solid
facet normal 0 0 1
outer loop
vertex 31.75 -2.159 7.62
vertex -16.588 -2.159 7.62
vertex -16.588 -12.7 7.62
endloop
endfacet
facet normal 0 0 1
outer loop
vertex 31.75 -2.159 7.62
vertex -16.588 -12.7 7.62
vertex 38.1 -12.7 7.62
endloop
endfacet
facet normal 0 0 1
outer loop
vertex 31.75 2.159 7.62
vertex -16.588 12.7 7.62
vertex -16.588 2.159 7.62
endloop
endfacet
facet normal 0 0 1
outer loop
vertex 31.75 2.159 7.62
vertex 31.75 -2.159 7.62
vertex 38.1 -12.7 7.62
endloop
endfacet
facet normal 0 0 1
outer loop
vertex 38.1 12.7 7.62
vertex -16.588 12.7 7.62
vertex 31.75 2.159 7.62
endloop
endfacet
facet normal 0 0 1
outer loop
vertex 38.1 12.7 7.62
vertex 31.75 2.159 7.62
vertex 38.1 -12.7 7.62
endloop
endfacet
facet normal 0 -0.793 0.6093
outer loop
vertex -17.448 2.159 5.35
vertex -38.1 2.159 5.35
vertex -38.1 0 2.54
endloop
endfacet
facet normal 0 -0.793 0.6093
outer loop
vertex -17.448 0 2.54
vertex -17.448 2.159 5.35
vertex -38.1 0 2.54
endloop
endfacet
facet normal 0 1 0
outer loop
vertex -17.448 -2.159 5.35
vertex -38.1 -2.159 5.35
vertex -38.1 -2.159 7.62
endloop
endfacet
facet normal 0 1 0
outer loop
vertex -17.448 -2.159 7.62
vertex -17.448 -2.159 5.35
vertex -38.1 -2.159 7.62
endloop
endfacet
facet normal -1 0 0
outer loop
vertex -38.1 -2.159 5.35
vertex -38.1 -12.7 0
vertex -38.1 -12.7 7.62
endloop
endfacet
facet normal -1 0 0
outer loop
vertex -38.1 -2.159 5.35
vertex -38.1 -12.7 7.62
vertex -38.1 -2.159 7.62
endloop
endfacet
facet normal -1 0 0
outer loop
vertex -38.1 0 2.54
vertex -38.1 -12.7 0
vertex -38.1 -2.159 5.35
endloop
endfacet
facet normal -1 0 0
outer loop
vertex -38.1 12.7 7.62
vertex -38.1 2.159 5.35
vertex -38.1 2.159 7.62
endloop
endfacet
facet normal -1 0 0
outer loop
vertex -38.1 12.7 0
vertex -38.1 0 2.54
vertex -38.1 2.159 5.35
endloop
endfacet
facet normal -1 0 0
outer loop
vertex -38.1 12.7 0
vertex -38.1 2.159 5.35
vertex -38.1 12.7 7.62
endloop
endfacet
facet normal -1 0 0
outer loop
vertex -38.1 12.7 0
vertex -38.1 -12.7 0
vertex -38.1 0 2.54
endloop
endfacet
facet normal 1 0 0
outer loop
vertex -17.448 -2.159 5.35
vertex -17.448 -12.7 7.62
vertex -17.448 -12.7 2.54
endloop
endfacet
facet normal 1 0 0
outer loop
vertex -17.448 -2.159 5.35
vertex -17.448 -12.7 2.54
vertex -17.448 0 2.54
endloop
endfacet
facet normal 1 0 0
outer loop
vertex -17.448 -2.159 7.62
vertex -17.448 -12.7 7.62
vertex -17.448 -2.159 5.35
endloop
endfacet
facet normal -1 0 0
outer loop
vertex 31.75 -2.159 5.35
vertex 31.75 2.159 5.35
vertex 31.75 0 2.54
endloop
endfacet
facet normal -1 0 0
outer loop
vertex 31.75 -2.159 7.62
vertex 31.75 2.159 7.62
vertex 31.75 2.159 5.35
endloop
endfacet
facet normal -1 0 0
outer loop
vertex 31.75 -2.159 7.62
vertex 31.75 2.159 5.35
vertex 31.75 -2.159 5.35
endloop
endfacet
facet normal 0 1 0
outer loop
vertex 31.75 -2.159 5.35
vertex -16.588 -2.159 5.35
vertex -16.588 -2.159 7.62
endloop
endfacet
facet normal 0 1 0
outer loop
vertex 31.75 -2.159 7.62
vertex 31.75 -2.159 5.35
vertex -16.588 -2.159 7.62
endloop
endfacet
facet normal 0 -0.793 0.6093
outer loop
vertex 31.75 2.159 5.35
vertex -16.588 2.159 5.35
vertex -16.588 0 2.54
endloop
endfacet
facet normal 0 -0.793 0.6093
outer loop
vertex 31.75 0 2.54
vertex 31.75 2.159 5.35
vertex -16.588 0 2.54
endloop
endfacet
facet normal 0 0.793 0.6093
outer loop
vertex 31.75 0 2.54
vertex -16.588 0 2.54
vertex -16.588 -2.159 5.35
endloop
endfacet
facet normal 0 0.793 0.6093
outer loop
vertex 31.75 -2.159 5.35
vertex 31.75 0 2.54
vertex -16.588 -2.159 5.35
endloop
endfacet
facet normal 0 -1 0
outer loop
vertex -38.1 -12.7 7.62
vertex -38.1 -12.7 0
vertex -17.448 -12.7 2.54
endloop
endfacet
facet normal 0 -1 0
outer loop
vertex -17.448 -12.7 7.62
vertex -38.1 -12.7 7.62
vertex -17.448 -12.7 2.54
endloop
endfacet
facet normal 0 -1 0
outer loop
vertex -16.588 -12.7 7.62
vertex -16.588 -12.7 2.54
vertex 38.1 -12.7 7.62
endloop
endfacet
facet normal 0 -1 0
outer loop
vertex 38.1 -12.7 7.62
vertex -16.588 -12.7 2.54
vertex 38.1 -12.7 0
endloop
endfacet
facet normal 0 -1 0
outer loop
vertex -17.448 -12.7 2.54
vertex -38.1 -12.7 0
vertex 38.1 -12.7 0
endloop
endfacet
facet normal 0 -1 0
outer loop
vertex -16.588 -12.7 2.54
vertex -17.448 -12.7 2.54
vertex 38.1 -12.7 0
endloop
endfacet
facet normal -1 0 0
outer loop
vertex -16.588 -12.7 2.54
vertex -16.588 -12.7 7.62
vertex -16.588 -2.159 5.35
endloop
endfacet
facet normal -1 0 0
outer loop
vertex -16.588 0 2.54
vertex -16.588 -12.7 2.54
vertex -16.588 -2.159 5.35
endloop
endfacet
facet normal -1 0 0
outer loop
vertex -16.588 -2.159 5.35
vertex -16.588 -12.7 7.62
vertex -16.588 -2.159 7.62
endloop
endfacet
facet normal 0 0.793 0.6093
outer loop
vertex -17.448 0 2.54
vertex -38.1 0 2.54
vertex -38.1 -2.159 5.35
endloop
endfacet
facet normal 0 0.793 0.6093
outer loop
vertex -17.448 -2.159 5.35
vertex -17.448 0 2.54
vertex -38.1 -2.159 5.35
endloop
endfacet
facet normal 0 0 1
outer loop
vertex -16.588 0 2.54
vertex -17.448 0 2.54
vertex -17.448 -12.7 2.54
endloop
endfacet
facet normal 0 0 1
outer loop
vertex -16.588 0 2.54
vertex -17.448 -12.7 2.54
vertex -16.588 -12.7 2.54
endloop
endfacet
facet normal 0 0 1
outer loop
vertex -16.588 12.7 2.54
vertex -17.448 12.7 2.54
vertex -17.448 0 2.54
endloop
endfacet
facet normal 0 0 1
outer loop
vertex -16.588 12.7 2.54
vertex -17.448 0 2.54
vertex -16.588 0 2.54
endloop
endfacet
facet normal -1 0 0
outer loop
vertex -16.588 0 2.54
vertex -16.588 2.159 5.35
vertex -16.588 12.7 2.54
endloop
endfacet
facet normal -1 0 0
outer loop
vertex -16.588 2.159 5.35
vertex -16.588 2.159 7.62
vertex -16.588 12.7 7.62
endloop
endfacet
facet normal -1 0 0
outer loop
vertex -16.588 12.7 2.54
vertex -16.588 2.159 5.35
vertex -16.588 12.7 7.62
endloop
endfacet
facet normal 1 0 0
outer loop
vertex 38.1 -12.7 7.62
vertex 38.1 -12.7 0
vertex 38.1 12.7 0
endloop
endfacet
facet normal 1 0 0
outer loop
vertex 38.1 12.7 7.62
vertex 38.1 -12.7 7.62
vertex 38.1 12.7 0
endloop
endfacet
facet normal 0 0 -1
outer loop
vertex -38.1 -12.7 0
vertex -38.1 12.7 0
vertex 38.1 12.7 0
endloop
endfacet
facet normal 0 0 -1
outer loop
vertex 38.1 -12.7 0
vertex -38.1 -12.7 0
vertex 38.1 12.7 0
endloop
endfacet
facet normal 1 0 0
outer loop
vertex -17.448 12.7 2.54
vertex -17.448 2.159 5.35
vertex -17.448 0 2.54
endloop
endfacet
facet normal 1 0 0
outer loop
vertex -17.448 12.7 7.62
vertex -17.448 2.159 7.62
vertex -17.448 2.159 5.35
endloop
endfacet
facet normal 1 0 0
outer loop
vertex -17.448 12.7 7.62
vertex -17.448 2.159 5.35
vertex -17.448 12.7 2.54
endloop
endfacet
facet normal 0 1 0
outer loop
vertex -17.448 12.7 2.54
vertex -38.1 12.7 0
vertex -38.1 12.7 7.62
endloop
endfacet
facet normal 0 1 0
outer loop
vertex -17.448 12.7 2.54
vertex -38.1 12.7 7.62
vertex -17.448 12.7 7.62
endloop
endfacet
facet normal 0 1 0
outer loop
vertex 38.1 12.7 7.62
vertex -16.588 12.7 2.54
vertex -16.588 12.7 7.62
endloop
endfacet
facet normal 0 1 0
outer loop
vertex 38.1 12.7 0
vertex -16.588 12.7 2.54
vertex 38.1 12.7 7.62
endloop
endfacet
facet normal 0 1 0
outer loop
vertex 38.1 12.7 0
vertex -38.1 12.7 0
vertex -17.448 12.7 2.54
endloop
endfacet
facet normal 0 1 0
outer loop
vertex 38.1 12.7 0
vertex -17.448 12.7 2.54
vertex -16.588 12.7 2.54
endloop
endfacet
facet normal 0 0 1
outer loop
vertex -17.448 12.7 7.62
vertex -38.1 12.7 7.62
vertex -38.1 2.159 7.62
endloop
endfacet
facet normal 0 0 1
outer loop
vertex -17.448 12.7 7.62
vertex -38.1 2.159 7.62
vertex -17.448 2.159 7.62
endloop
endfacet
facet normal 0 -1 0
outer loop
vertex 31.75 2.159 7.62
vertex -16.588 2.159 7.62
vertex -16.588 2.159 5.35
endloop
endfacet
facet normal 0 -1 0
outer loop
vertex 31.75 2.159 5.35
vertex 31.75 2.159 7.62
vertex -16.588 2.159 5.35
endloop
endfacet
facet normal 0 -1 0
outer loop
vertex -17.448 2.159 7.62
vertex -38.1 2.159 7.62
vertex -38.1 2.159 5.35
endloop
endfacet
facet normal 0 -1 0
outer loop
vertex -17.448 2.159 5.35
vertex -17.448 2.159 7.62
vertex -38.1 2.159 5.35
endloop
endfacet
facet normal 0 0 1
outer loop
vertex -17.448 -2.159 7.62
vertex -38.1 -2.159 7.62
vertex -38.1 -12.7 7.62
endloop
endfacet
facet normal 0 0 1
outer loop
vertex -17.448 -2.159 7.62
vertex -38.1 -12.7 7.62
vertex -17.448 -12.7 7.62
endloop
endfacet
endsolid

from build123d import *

# Parameters (mm, degrees)
F0_W     = 76.2
F0_H     = 25.4
F1_DEPTH = 7.62
F3_DEPTH = 69.85
F4_W     = 0.860754
F4_H     = 25.4
F5_DEPTH = 5.08


with BuildPart() as f1:
    # F0 (on Top) → F1 (new body)
    with BuildSketch(Plane.XY):
        Rectangle(F0_W, F0_H)
    extrude(amount=F1_DEPTH)

    # F2 (on face) → F3 (cut)
    with BuildSketch(Plane(origin=(-38.1, 0, 0), x_dir=(0, -1, 0), z_dir=(-1, 0, 0))):
        Polygon((2.159, 7.62), (-2.159, 7.62), (-2.159, 5.349967), (0, 2.54), (2.159, 5.349967), align=None)
    extrude(amount=-F3_DEPTH, mode=Mode.SUBTRACT)

    # F4 (on face) → F5 (cut)
    with BuildSketch(Plane.XY.offset(7.62)):
        with Locations((-17.018, 0)):
            Rectangle(F4_W, F4_H)
    extrude(amount=-F5_DEPTH, mode=Mode.SUBTRACT)


solid = f1.part
